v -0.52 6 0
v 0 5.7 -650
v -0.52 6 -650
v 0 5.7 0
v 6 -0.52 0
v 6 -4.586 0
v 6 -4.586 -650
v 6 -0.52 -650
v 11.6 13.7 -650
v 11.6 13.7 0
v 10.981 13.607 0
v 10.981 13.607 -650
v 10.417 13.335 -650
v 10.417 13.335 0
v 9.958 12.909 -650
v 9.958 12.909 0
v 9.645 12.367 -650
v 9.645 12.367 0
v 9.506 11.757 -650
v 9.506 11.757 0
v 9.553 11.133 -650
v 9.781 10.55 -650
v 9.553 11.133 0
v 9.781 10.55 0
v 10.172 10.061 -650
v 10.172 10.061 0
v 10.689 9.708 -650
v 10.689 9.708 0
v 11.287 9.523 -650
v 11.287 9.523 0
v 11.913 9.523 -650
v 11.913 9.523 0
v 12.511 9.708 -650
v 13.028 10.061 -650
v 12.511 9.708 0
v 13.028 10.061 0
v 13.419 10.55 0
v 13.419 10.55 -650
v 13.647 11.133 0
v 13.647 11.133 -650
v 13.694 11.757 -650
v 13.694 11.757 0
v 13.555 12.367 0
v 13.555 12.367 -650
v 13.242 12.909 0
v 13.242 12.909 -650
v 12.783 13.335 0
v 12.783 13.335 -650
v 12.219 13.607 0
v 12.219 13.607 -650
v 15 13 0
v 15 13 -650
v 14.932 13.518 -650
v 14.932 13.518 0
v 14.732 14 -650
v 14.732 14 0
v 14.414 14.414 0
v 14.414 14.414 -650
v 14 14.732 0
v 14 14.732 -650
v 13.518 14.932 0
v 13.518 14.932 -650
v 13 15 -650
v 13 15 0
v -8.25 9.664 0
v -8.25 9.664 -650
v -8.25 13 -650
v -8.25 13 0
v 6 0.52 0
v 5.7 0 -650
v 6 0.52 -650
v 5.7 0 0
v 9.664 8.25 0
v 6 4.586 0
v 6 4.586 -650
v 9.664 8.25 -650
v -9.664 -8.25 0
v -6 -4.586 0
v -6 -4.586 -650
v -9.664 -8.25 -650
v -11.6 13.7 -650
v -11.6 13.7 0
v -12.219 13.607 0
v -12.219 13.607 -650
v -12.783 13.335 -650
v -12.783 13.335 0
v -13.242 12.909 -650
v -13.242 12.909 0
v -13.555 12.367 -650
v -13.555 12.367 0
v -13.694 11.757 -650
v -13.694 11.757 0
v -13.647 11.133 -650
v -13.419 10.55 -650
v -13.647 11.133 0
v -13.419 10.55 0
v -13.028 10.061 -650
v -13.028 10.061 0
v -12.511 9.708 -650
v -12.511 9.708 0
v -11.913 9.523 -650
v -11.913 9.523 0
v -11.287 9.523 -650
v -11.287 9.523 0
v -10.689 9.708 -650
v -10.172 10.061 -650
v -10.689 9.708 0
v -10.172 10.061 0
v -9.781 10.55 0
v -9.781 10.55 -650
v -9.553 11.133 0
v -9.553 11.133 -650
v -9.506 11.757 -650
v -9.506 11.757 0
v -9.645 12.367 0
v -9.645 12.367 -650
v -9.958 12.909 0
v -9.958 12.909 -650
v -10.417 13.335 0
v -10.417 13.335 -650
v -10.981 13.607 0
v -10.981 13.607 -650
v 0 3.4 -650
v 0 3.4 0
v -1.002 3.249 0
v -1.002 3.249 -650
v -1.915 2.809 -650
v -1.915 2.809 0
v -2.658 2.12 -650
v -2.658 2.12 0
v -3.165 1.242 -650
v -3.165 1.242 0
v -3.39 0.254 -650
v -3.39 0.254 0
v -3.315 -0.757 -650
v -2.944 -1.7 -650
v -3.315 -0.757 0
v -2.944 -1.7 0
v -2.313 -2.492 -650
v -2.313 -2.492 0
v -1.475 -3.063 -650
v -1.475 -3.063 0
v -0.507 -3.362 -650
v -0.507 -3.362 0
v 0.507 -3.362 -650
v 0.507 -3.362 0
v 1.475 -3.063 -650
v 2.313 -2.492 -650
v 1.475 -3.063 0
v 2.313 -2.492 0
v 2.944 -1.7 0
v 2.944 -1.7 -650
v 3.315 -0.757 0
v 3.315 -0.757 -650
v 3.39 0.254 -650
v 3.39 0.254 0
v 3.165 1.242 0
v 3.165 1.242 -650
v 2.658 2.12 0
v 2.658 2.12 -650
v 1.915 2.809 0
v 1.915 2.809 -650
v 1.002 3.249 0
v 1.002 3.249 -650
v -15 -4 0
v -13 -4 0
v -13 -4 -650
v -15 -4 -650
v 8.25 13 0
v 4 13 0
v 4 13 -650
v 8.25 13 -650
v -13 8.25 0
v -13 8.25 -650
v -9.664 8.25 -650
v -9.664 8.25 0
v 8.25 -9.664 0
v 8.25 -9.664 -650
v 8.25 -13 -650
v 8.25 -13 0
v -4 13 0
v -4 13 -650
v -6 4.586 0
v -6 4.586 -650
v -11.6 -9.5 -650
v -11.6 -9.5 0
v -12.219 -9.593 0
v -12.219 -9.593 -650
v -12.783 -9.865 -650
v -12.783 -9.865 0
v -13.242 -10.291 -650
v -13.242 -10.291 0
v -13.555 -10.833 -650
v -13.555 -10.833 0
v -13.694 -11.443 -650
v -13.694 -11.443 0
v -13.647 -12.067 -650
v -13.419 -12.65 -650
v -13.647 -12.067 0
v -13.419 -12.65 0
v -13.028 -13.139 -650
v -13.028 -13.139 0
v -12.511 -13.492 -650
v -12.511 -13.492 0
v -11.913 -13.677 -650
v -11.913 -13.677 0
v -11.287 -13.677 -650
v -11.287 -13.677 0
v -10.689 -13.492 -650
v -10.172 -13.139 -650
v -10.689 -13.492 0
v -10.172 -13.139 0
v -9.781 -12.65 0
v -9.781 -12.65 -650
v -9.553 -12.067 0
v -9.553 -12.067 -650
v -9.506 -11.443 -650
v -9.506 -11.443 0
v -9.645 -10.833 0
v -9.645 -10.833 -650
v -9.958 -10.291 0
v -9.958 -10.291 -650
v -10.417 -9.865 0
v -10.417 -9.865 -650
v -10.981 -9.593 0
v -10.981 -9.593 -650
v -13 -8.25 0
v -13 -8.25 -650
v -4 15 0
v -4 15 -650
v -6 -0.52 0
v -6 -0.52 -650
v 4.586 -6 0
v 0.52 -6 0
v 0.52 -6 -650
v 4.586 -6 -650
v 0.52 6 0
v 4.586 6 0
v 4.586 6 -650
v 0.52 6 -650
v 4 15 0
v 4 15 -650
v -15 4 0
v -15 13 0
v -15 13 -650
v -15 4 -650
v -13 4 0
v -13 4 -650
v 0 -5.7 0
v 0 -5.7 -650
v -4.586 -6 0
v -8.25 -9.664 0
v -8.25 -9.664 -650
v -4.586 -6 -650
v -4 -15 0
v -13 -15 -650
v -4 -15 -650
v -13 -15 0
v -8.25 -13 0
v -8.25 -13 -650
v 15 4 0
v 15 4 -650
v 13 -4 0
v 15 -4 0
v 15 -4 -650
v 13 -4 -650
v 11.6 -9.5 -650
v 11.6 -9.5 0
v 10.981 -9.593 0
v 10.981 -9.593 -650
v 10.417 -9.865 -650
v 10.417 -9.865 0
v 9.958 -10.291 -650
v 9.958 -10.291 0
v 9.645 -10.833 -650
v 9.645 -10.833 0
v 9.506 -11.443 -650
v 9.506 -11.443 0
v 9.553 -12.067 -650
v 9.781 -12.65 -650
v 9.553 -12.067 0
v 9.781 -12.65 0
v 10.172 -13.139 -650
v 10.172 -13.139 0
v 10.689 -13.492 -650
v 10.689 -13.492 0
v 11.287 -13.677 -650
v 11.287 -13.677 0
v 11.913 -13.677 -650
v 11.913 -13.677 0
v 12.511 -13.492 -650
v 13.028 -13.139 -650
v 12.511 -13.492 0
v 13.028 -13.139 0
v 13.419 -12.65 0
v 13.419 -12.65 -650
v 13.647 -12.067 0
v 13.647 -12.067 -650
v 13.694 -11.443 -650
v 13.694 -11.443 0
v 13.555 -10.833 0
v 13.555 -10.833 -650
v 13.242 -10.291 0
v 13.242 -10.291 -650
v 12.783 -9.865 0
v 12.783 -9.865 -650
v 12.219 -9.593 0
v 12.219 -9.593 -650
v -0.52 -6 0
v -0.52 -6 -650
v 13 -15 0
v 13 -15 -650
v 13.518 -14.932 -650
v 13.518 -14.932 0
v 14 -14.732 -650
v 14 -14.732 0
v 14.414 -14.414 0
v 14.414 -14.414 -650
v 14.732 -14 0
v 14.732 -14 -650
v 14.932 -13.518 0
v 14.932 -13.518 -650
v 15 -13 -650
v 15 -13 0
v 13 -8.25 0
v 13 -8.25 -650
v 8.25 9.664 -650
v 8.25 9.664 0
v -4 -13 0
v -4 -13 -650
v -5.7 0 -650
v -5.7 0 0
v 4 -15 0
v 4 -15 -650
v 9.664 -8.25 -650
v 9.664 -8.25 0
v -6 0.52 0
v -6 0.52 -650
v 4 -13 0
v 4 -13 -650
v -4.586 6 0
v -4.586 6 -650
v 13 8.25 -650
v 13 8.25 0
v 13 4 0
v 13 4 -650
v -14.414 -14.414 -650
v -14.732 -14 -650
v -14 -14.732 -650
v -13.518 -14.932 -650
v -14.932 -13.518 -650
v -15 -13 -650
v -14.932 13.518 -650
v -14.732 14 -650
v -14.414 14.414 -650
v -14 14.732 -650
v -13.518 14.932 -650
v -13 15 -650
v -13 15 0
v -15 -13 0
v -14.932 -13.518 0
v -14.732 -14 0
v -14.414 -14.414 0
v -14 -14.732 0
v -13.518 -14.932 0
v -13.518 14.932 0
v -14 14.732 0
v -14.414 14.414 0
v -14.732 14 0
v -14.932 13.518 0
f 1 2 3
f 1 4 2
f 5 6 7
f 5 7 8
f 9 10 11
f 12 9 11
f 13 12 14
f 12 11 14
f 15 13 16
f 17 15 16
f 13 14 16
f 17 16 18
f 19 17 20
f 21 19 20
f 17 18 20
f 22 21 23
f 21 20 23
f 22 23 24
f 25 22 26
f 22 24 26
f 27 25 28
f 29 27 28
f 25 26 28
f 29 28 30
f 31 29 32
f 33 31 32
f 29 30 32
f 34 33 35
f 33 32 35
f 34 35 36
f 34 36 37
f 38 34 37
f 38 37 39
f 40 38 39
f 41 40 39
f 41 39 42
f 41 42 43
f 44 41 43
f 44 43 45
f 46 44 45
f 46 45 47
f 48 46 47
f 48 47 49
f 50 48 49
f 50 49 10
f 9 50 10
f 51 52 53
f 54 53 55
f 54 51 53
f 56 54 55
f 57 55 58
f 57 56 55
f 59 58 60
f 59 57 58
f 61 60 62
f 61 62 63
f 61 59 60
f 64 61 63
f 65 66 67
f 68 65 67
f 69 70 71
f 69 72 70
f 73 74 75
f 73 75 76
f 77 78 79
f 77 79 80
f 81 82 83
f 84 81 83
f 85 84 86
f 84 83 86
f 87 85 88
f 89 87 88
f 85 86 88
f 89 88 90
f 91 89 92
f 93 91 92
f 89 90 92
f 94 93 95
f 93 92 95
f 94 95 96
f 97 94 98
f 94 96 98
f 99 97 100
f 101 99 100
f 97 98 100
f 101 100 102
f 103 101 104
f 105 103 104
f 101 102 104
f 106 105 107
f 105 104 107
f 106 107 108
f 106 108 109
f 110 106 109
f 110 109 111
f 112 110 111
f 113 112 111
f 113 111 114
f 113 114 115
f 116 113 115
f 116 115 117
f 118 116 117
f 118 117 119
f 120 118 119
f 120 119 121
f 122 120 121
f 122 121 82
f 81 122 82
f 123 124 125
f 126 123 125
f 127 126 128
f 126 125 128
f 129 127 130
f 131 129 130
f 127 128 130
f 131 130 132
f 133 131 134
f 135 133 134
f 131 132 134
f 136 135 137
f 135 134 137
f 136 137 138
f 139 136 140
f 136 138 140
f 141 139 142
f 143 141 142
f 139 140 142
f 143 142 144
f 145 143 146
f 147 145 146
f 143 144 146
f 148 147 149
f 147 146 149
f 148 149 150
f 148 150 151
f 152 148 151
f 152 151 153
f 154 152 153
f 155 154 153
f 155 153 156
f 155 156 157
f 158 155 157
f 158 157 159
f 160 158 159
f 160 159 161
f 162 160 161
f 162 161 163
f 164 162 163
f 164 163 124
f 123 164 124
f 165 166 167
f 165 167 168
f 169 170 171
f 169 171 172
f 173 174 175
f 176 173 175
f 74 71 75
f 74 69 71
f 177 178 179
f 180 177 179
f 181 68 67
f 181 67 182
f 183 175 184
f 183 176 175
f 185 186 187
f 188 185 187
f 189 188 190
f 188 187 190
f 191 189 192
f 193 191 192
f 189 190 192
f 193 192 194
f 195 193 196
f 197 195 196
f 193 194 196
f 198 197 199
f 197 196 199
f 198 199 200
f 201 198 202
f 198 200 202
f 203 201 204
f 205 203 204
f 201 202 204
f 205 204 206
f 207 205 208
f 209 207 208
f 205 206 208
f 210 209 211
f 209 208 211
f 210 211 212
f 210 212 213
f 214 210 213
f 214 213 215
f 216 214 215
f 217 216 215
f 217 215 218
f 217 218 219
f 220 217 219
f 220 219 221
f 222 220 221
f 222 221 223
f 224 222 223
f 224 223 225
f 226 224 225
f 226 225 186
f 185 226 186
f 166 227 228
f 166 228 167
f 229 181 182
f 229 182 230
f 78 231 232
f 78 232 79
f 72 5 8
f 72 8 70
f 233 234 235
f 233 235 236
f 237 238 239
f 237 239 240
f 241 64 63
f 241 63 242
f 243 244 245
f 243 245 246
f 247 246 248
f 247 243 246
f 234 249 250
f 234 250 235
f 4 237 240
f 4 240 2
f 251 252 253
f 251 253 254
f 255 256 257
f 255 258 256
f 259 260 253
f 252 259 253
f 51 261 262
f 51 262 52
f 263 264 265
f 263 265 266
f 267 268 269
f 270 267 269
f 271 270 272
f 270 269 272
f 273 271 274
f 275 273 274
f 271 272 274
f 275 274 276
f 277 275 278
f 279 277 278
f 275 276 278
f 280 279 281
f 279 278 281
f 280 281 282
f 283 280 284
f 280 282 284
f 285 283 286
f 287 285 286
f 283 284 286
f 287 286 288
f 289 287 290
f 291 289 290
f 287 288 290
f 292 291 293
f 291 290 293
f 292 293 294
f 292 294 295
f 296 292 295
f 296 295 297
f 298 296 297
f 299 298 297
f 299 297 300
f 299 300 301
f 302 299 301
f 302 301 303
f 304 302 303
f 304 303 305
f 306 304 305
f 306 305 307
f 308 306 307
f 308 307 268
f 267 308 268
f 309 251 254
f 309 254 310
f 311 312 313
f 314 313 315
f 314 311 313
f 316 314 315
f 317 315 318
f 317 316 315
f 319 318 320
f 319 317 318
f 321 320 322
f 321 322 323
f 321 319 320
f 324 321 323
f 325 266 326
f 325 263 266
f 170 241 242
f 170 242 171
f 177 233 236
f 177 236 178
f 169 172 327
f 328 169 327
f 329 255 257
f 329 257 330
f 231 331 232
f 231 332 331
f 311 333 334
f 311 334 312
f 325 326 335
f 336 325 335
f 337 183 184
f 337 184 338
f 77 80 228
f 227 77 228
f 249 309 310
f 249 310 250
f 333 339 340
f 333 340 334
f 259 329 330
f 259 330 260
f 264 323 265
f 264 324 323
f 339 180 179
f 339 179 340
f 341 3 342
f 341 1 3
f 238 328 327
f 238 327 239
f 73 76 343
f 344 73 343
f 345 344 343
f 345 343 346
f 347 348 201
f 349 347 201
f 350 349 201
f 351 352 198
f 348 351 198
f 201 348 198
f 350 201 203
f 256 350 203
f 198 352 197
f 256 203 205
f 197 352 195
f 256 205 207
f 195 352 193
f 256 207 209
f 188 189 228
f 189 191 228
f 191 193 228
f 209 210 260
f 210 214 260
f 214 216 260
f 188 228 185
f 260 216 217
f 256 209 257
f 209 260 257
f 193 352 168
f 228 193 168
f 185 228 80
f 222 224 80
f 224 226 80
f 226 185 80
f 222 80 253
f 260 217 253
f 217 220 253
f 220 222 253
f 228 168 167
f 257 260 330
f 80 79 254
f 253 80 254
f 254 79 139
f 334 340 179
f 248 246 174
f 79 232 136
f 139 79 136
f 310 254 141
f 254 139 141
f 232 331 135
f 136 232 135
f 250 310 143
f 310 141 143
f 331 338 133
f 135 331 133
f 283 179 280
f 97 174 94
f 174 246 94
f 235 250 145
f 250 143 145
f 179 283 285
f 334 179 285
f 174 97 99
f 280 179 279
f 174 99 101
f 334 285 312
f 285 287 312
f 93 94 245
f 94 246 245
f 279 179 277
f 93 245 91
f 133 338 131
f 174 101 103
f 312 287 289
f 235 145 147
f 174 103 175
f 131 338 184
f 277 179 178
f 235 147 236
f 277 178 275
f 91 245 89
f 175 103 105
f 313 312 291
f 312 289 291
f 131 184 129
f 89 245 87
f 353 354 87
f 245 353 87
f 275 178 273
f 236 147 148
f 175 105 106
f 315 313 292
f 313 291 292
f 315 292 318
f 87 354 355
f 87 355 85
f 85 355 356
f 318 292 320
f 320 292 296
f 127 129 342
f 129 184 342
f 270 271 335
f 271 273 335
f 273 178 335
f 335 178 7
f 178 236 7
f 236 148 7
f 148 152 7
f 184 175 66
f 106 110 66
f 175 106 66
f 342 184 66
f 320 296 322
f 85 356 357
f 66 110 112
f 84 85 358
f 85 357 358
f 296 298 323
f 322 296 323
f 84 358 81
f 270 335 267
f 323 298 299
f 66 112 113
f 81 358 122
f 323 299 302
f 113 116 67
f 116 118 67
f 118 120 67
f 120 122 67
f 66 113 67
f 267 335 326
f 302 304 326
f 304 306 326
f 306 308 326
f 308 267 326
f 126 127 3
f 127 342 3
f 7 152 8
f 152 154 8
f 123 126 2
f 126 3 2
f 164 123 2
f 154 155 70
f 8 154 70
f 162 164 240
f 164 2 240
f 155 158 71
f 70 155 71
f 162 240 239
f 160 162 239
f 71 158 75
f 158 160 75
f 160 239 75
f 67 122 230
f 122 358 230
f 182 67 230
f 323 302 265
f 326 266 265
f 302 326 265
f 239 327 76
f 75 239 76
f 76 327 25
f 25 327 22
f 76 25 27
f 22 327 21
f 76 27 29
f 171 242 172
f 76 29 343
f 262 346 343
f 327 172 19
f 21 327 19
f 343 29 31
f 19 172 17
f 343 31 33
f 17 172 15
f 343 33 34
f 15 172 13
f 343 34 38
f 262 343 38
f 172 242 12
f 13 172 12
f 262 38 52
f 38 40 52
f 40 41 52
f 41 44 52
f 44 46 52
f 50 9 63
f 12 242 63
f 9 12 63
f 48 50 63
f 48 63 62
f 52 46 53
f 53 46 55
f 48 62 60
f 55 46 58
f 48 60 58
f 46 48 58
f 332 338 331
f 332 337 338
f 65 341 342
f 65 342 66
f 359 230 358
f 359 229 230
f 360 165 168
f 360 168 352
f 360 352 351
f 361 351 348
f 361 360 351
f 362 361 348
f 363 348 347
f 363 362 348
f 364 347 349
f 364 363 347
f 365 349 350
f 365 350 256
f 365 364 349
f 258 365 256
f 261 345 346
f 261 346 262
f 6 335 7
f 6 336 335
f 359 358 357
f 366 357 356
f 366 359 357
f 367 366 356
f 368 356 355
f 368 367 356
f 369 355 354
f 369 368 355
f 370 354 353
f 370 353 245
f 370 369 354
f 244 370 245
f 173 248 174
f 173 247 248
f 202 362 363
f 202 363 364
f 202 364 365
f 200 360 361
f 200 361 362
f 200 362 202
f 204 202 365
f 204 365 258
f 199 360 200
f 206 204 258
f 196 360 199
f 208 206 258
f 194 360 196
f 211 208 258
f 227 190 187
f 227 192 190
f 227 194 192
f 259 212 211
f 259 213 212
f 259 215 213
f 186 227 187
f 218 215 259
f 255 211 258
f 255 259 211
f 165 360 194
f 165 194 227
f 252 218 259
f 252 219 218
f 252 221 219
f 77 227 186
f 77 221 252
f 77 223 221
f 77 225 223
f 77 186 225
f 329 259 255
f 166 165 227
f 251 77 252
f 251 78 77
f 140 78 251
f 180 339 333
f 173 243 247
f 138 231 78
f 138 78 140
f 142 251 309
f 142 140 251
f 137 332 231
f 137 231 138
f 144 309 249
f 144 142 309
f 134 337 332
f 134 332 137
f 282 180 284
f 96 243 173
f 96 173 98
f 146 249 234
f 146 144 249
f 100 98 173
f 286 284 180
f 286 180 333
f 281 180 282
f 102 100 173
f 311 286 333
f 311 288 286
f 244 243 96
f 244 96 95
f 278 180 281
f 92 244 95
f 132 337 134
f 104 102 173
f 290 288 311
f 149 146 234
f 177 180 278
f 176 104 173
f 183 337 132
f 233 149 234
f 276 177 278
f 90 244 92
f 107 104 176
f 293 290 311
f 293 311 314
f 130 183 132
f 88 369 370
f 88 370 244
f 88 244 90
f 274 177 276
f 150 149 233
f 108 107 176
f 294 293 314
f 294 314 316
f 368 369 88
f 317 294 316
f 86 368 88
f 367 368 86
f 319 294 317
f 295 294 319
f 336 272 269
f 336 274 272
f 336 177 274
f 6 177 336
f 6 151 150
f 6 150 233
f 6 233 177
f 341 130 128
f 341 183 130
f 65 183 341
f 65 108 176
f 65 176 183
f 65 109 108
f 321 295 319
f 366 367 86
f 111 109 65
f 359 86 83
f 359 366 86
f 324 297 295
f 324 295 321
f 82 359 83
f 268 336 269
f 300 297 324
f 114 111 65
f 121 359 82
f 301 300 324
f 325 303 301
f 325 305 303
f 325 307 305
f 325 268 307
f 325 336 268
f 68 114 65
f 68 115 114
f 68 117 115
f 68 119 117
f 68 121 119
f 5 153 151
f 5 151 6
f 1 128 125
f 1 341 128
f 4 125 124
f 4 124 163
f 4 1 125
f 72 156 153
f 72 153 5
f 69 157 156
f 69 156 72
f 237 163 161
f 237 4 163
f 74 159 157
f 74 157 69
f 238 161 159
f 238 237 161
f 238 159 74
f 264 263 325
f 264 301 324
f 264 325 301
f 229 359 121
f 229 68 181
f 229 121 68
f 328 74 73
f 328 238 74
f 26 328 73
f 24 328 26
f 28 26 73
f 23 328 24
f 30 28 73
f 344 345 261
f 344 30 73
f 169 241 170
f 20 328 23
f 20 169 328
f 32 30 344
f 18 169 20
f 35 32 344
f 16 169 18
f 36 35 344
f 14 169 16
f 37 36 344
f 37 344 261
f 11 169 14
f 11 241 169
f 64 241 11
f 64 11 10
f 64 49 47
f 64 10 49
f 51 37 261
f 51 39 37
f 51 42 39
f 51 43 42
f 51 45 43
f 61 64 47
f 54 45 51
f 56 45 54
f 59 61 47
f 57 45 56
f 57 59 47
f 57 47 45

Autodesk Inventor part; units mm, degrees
sketch "Sketch_1" plane through (0, 0, 0) normal (0, 0, 1) x (1, 0, 0)
  line L0 (-15, 4) -> (-13, 4)
  line L1 (-13, 4) -> (-13, 8.25)
  line L2 (-13, 8.25) -> (-9.6642, 8.25)
  line L3 (-9.6642, 8.25) -> (-6, 4.5858)
  line L4 (-6, 4.5858) -> (-6, 0.5196)
  line L5 (-6, 0.5196) -> (-5.7, 0)
  line L6 (-5.7, 0) -> (-6, -0.5196)
  line L7 (-6, -0.5196) -> (-6, -4.5858)
  line L8 (-6, -4.5858) -> (-9.6642, -8.25)
  line L9 (-9.6642, -8.25) -> (-13, -8.25)
  line L10 (-13, -8.25) -> (-13, -4)
  line L11 (-13, -4) -> (-15, -4)
  line L12 (-15, -4) -> (-15, -13)
  arc A0 (-15, -13) -> (-13, -15) centre (-13, -13) ccw
  line L13 (-13, -15) -> (-4, -15)
  line L14 (-4, -15) -> (-4, -13)
  line L15 (-4, -13) -> (-8.25, -13)
  line L16 (-8.25, -13) -> (-8.25, -9.6642)
  line L17 (-8.25, -9.6642) -> (-4.5858, -6)
  line L18 (-4.5858, -6) -> (-0.5196, -6)
  line L19 (-0.5196, -6) -> (0, -5.7)
  line L20 (0, -5.7) -> (0.5196, -6)
  line L21 (0.5196, -6) -> (4.5858, -6)
  line L22 (4.5858, -6) -> (8.25, -9.6642)
  line L23 (8.25, -9.6642) -> (8.25, -13)
  line L24 (8.25, -13) -> (4, -13)
  line L25 (4, -13) -> (4, -15)
  line L26 (4, -15) -> (13, -15)
  arc A1 (13, -15) -> (15, -13) centre (13, -13) ccw
  line L27 (15, -13) -> (15, -4)
  line L28 (15, -4) -> (13, -4)
  line L29 (13, -4) -> (13, -8.25)
  line L30 (13, -8.25) -> (9.6642, -8.25)
  line L31 (9.6642, -8.25) -> (6, -4.5858)
  line L32 (6, -4.5858) -> (6, -0.5196)
  line L33 (6, -0.5196) -> (5.7, 0)
  line L34 (5.7, 0) -> (6, 0.5196)
  line L35 (6, 0.5196) -> (6, 4.5858)
  line L36 (6, 4.5858) -> (9.6642, 8.25)
  line L37 (9.6642, 8.25) -> (13, 8.25)
  line L38 (13, 8.25) -> (13, 4)
  line L39 (13, 4) -> (15, 4)
  line L40 (15, 4) -> (15, 13)
  arc A2 (15, 13) -> (13, 15) centre (13, 13) ccw
  line L41 (13, 15) -> (4, 15)
  line L42 (4, 15) -> (4, 13)
  line L43 (4, 13) -> (8.25, 13)
  line L44 (8.25, 13) -> (8.25, 9.6642)
  line L45 (8.25, 9.6642) -> (4.5858, 6)
  line L46 (4.5858, 6) -> (0.5196, 6)
  line L47 (0.5196, 6) -> (0, 5.7)
  line L48 (0, 5.7) -> (-0.5196, 6)
  line L49 (-0.5196, 6) -> (-4.5858, 6)
  line L50 (-4.5858, 6) -> (-8.25, 9.6642)
  line L51 (-8.25, 9.6642) -> (-8.25, 13)
  line L52 (-8.25, 13) -> (-4, 13)
  line L53 (-4, 13) -> (-4, 15)
  line L54 (-4, 15) -> (-13, 15)
  arc A3 (-13, 15) -> (-15, 13) centre (-13, 13) ccw
  line L55 (-15, 13) -> (-15, 4)
extrude "Extrusion1" add sketch "Sketch_1" against normal blind 650
sketch "Sketch2" plane through (0, 0, -650) normal (0, 0, -1) x (-1, 0, 0)
  point P0 (0, 0)
hole "Hole1" at (0, 0, -650) direction (0, 0, 1) diameter 6.8 depth 650
sketch "Sketch3" plane through (0, 0, -650) normal (0, 0, -1) x (-1, 0, 0)
  point P0 (-11.6, 11.6)
hole "Hole2" at (11.6, 11.6, -650) direction (0, 0, 1) diameter 4.2 depth 650
pattern_linear "Rectangular Pattern1" count 2 spacing 23.2 along (-1, 0, 0) count 2 spacing 23.2 along (0, -1, 0) of "Hole2"
ref_plane "C1_XY" through (0, 0, 0) normal (0, 0, 1) x (1, 0, 0)
ref_plane "C1_YZ" through (0, 0, 0) normal (1, 0, 0) x (0, 1, 0)
ref_plane "C1_ZX" through (0, 0, 0) normal (0, 1, 0) x (0, 0, 1)
ref_plane "to_frame_cap1_XY" through (0, 0, 0) normal (0, 0, 1) x (1, 0, 0)
ref_plane "to_frame_cap1_YZ" through (0, 0, 0) normal (1, 0, 0) x (0, 1, 0)
ref_plane "to_frame_cap1_ZX" through (0, 0, 0) normal (0, 1, 0) x (0, 0, 1)
ref_plane "to_frame_cap2_XY" through (0, 0, -650) normal (0, 0, -1) x (1, 0, 0)
ref_plane "to_frame_cap2_YZ" through (0, 0, -650) normal (1, 0, 0) x (0, -1, 0)
ref_plane "to_frame_cap2_ZX" through (0, 0, -650) normal (0, -1, 0) x (0, 0, -1)
properties part number "HFS6-3030-650"
